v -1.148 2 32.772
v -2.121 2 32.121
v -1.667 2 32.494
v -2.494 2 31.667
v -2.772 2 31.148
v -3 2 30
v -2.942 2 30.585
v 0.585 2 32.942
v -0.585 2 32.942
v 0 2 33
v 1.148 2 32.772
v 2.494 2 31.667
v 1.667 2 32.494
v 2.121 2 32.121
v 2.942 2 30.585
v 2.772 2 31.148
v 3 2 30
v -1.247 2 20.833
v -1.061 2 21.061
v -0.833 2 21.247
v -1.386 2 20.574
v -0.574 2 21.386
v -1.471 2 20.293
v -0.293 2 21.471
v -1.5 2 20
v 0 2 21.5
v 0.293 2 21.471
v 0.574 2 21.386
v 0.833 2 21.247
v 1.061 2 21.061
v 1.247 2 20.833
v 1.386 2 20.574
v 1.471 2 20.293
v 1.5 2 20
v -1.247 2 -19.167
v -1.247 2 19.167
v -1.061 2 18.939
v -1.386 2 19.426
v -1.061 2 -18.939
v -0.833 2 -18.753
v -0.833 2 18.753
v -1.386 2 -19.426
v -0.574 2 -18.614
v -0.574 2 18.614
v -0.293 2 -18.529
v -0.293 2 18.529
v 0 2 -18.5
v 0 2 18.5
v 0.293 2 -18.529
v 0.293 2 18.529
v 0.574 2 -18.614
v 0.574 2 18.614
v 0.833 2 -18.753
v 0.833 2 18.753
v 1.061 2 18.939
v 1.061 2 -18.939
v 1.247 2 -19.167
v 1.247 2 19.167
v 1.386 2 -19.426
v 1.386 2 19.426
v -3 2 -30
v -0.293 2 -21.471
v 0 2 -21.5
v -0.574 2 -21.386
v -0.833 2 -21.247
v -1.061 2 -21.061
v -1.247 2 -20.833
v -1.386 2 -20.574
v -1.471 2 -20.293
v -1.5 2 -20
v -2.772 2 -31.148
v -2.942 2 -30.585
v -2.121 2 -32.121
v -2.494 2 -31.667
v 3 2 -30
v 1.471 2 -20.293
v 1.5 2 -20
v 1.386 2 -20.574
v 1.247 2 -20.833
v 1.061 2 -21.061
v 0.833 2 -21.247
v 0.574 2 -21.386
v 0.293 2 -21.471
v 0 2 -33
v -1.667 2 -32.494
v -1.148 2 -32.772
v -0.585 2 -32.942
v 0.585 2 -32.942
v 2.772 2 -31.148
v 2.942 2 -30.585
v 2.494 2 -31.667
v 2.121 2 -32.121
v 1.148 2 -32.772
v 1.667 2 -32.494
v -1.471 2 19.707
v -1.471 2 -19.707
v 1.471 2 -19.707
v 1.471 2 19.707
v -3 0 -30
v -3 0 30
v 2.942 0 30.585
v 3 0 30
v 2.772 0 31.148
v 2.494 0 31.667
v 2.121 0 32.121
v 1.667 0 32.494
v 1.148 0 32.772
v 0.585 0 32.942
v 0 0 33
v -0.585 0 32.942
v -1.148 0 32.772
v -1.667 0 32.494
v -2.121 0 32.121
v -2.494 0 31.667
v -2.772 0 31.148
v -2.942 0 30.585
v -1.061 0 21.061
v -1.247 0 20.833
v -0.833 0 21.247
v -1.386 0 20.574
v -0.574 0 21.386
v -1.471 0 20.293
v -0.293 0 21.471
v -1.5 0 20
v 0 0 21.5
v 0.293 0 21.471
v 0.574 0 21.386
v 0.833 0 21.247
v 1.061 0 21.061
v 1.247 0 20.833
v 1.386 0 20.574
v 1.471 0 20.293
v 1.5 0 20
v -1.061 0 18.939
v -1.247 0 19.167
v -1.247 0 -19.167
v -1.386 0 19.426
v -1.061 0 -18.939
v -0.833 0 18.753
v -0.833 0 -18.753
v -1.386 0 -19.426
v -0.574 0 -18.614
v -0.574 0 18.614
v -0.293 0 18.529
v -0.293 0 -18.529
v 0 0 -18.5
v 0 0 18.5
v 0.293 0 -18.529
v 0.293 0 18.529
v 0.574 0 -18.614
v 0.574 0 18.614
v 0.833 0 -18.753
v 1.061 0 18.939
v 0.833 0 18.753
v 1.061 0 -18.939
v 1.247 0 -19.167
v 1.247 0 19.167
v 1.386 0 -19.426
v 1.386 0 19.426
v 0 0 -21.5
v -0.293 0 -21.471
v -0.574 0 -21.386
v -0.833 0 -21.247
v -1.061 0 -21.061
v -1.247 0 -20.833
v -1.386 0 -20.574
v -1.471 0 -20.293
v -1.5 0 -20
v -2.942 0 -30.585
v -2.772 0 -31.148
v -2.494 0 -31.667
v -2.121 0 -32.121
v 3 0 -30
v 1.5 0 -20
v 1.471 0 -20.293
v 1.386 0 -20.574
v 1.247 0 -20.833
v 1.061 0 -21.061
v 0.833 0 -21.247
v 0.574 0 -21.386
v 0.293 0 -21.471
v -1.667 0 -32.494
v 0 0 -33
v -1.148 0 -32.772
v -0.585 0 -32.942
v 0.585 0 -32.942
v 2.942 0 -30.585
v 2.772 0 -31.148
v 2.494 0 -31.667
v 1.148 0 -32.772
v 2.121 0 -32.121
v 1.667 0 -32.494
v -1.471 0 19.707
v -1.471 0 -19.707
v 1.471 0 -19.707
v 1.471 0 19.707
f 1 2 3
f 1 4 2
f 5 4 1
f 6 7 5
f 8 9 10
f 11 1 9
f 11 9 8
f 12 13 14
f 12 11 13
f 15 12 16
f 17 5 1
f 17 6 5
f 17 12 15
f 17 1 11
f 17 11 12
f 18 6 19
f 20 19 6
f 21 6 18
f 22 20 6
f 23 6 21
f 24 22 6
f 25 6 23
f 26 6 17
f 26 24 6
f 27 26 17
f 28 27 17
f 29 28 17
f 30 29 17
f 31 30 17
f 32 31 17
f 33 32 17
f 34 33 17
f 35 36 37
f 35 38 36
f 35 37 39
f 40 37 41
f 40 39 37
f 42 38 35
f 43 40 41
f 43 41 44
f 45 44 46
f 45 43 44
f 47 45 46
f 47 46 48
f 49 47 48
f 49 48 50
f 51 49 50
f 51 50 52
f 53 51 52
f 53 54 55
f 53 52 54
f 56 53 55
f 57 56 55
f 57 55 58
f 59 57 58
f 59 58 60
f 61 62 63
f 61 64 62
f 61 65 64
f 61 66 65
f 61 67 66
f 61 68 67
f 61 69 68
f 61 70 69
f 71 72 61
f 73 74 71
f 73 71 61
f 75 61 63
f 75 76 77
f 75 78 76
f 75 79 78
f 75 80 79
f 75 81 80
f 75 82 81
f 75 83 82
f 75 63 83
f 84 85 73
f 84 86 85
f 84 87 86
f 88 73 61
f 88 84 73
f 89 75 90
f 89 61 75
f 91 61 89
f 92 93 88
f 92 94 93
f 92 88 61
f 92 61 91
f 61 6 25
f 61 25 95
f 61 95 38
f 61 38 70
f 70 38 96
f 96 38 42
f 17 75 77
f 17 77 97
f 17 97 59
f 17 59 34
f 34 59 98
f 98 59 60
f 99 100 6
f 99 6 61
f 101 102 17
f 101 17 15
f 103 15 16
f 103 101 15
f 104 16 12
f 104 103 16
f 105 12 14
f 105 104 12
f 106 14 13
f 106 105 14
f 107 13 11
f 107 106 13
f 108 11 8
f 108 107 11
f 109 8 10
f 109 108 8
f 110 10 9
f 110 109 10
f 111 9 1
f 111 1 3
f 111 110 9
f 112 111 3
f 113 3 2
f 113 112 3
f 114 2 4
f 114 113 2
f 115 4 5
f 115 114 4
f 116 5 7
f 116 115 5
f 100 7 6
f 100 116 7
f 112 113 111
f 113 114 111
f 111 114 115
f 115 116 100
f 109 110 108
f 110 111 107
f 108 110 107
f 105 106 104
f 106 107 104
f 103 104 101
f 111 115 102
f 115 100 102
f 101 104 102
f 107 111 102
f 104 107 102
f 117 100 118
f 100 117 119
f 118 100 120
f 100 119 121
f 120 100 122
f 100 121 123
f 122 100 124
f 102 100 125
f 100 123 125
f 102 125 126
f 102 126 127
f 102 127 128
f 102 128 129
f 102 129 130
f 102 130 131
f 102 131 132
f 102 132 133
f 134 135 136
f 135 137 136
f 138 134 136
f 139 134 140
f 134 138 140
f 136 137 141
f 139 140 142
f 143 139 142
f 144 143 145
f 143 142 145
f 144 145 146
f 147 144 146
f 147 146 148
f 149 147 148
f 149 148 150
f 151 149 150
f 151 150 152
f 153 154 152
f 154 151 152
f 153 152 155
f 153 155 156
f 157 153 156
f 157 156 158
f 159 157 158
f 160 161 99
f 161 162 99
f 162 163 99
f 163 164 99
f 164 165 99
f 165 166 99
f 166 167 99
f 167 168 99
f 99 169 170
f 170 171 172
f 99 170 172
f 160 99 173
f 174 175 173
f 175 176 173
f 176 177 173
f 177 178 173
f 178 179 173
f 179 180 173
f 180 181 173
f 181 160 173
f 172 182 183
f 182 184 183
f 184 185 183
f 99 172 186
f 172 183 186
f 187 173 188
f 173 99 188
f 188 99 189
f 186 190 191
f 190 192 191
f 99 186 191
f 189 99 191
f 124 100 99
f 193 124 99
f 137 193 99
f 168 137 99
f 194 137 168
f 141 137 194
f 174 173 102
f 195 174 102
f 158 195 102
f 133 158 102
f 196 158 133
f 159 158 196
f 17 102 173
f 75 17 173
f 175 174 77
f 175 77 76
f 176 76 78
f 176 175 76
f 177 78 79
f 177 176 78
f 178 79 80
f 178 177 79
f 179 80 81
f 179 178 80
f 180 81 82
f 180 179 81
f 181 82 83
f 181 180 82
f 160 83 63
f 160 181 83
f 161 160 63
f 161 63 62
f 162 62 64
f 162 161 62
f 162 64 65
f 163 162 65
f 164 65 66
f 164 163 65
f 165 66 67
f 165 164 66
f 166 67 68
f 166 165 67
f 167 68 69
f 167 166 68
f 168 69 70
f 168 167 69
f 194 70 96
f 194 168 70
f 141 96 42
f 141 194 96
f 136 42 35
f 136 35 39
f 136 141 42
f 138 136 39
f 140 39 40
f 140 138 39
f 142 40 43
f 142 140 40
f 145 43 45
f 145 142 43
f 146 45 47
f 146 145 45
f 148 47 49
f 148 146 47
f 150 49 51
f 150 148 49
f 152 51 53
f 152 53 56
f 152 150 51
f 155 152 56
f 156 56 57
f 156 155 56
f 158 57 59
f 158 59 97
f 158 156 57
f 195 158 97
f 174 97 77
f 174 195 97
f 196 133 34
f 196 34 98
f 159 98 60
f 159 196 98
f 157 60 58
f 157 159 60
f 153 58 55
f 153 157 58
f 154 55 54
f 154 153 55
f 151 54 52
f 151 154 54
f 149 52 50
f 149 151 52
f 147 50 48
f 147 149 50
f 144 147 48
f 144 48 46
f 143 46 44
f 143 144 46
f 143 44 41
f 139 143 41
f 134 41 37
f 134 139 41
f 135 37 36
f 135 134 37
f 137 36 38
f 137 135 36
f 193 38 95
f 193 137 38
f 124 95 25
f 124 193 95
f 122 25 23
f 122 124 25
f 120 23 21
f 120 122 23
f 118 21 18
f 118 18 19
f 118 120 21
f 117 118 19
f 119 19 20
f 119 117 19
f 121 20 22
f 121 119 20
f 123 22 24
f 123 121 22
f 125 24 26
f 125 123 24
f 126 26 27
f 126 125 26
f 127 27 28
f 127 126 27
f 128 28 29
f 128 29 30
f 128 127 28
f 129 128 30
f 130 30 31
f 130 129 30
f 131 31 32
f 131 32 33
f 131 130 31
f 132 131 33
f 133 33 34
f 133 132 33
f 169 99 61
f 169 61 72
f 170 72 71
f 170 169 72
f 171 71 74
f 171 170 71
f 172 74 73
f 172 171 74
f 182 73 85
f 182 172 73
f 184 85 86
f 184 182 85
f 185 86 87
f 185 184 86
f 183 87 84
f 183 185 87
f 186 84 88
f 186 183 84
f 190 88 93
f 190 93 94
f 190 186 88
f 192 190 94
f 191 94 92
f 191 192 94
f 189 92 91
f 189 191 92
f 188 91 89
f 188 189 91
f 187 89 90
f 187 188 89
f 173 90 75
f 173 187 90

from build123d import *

# Parameters (mm, degrees)
SKETCH1_W           = 6
SKETCH1_H           = 60
SKETCH1_R           = 1.5
BOSS_EXTRUDE1_DEPTH = 2


with BuildPart() as part:
    # Sketch1 → Boss-Extrude1 (new body)
    with BuildSketch(Plane(origin=(0, 0, 0), x_dir=(1, 0, 0), z_dir=(0, 1, 0))):
        Rectangle(SKETCH1_W, SKETCH1_H)
        with Locations((0, -20)):
            Circle(SKETCH1_R, mode=Mode.SUBTRACT)
        with Locations((0, 20)):
            Circle(SKETCH1_R, mode=Mode.SUBTRACT)
        with BuildLine():
            Line((-3, -30), (3, -30))
            ThreePointArc((3, -30), (0, -33), (-3, -30))
        make_face()
        with BuildLine():
            ThreePointArc((-3, 30), (0, 33), (3, 30))
            Line((3, 30), (-3, 30))
        make_face()
    extrude(amount=BOSS_EXTRUDE1_DEPTH)


solid = part.part
